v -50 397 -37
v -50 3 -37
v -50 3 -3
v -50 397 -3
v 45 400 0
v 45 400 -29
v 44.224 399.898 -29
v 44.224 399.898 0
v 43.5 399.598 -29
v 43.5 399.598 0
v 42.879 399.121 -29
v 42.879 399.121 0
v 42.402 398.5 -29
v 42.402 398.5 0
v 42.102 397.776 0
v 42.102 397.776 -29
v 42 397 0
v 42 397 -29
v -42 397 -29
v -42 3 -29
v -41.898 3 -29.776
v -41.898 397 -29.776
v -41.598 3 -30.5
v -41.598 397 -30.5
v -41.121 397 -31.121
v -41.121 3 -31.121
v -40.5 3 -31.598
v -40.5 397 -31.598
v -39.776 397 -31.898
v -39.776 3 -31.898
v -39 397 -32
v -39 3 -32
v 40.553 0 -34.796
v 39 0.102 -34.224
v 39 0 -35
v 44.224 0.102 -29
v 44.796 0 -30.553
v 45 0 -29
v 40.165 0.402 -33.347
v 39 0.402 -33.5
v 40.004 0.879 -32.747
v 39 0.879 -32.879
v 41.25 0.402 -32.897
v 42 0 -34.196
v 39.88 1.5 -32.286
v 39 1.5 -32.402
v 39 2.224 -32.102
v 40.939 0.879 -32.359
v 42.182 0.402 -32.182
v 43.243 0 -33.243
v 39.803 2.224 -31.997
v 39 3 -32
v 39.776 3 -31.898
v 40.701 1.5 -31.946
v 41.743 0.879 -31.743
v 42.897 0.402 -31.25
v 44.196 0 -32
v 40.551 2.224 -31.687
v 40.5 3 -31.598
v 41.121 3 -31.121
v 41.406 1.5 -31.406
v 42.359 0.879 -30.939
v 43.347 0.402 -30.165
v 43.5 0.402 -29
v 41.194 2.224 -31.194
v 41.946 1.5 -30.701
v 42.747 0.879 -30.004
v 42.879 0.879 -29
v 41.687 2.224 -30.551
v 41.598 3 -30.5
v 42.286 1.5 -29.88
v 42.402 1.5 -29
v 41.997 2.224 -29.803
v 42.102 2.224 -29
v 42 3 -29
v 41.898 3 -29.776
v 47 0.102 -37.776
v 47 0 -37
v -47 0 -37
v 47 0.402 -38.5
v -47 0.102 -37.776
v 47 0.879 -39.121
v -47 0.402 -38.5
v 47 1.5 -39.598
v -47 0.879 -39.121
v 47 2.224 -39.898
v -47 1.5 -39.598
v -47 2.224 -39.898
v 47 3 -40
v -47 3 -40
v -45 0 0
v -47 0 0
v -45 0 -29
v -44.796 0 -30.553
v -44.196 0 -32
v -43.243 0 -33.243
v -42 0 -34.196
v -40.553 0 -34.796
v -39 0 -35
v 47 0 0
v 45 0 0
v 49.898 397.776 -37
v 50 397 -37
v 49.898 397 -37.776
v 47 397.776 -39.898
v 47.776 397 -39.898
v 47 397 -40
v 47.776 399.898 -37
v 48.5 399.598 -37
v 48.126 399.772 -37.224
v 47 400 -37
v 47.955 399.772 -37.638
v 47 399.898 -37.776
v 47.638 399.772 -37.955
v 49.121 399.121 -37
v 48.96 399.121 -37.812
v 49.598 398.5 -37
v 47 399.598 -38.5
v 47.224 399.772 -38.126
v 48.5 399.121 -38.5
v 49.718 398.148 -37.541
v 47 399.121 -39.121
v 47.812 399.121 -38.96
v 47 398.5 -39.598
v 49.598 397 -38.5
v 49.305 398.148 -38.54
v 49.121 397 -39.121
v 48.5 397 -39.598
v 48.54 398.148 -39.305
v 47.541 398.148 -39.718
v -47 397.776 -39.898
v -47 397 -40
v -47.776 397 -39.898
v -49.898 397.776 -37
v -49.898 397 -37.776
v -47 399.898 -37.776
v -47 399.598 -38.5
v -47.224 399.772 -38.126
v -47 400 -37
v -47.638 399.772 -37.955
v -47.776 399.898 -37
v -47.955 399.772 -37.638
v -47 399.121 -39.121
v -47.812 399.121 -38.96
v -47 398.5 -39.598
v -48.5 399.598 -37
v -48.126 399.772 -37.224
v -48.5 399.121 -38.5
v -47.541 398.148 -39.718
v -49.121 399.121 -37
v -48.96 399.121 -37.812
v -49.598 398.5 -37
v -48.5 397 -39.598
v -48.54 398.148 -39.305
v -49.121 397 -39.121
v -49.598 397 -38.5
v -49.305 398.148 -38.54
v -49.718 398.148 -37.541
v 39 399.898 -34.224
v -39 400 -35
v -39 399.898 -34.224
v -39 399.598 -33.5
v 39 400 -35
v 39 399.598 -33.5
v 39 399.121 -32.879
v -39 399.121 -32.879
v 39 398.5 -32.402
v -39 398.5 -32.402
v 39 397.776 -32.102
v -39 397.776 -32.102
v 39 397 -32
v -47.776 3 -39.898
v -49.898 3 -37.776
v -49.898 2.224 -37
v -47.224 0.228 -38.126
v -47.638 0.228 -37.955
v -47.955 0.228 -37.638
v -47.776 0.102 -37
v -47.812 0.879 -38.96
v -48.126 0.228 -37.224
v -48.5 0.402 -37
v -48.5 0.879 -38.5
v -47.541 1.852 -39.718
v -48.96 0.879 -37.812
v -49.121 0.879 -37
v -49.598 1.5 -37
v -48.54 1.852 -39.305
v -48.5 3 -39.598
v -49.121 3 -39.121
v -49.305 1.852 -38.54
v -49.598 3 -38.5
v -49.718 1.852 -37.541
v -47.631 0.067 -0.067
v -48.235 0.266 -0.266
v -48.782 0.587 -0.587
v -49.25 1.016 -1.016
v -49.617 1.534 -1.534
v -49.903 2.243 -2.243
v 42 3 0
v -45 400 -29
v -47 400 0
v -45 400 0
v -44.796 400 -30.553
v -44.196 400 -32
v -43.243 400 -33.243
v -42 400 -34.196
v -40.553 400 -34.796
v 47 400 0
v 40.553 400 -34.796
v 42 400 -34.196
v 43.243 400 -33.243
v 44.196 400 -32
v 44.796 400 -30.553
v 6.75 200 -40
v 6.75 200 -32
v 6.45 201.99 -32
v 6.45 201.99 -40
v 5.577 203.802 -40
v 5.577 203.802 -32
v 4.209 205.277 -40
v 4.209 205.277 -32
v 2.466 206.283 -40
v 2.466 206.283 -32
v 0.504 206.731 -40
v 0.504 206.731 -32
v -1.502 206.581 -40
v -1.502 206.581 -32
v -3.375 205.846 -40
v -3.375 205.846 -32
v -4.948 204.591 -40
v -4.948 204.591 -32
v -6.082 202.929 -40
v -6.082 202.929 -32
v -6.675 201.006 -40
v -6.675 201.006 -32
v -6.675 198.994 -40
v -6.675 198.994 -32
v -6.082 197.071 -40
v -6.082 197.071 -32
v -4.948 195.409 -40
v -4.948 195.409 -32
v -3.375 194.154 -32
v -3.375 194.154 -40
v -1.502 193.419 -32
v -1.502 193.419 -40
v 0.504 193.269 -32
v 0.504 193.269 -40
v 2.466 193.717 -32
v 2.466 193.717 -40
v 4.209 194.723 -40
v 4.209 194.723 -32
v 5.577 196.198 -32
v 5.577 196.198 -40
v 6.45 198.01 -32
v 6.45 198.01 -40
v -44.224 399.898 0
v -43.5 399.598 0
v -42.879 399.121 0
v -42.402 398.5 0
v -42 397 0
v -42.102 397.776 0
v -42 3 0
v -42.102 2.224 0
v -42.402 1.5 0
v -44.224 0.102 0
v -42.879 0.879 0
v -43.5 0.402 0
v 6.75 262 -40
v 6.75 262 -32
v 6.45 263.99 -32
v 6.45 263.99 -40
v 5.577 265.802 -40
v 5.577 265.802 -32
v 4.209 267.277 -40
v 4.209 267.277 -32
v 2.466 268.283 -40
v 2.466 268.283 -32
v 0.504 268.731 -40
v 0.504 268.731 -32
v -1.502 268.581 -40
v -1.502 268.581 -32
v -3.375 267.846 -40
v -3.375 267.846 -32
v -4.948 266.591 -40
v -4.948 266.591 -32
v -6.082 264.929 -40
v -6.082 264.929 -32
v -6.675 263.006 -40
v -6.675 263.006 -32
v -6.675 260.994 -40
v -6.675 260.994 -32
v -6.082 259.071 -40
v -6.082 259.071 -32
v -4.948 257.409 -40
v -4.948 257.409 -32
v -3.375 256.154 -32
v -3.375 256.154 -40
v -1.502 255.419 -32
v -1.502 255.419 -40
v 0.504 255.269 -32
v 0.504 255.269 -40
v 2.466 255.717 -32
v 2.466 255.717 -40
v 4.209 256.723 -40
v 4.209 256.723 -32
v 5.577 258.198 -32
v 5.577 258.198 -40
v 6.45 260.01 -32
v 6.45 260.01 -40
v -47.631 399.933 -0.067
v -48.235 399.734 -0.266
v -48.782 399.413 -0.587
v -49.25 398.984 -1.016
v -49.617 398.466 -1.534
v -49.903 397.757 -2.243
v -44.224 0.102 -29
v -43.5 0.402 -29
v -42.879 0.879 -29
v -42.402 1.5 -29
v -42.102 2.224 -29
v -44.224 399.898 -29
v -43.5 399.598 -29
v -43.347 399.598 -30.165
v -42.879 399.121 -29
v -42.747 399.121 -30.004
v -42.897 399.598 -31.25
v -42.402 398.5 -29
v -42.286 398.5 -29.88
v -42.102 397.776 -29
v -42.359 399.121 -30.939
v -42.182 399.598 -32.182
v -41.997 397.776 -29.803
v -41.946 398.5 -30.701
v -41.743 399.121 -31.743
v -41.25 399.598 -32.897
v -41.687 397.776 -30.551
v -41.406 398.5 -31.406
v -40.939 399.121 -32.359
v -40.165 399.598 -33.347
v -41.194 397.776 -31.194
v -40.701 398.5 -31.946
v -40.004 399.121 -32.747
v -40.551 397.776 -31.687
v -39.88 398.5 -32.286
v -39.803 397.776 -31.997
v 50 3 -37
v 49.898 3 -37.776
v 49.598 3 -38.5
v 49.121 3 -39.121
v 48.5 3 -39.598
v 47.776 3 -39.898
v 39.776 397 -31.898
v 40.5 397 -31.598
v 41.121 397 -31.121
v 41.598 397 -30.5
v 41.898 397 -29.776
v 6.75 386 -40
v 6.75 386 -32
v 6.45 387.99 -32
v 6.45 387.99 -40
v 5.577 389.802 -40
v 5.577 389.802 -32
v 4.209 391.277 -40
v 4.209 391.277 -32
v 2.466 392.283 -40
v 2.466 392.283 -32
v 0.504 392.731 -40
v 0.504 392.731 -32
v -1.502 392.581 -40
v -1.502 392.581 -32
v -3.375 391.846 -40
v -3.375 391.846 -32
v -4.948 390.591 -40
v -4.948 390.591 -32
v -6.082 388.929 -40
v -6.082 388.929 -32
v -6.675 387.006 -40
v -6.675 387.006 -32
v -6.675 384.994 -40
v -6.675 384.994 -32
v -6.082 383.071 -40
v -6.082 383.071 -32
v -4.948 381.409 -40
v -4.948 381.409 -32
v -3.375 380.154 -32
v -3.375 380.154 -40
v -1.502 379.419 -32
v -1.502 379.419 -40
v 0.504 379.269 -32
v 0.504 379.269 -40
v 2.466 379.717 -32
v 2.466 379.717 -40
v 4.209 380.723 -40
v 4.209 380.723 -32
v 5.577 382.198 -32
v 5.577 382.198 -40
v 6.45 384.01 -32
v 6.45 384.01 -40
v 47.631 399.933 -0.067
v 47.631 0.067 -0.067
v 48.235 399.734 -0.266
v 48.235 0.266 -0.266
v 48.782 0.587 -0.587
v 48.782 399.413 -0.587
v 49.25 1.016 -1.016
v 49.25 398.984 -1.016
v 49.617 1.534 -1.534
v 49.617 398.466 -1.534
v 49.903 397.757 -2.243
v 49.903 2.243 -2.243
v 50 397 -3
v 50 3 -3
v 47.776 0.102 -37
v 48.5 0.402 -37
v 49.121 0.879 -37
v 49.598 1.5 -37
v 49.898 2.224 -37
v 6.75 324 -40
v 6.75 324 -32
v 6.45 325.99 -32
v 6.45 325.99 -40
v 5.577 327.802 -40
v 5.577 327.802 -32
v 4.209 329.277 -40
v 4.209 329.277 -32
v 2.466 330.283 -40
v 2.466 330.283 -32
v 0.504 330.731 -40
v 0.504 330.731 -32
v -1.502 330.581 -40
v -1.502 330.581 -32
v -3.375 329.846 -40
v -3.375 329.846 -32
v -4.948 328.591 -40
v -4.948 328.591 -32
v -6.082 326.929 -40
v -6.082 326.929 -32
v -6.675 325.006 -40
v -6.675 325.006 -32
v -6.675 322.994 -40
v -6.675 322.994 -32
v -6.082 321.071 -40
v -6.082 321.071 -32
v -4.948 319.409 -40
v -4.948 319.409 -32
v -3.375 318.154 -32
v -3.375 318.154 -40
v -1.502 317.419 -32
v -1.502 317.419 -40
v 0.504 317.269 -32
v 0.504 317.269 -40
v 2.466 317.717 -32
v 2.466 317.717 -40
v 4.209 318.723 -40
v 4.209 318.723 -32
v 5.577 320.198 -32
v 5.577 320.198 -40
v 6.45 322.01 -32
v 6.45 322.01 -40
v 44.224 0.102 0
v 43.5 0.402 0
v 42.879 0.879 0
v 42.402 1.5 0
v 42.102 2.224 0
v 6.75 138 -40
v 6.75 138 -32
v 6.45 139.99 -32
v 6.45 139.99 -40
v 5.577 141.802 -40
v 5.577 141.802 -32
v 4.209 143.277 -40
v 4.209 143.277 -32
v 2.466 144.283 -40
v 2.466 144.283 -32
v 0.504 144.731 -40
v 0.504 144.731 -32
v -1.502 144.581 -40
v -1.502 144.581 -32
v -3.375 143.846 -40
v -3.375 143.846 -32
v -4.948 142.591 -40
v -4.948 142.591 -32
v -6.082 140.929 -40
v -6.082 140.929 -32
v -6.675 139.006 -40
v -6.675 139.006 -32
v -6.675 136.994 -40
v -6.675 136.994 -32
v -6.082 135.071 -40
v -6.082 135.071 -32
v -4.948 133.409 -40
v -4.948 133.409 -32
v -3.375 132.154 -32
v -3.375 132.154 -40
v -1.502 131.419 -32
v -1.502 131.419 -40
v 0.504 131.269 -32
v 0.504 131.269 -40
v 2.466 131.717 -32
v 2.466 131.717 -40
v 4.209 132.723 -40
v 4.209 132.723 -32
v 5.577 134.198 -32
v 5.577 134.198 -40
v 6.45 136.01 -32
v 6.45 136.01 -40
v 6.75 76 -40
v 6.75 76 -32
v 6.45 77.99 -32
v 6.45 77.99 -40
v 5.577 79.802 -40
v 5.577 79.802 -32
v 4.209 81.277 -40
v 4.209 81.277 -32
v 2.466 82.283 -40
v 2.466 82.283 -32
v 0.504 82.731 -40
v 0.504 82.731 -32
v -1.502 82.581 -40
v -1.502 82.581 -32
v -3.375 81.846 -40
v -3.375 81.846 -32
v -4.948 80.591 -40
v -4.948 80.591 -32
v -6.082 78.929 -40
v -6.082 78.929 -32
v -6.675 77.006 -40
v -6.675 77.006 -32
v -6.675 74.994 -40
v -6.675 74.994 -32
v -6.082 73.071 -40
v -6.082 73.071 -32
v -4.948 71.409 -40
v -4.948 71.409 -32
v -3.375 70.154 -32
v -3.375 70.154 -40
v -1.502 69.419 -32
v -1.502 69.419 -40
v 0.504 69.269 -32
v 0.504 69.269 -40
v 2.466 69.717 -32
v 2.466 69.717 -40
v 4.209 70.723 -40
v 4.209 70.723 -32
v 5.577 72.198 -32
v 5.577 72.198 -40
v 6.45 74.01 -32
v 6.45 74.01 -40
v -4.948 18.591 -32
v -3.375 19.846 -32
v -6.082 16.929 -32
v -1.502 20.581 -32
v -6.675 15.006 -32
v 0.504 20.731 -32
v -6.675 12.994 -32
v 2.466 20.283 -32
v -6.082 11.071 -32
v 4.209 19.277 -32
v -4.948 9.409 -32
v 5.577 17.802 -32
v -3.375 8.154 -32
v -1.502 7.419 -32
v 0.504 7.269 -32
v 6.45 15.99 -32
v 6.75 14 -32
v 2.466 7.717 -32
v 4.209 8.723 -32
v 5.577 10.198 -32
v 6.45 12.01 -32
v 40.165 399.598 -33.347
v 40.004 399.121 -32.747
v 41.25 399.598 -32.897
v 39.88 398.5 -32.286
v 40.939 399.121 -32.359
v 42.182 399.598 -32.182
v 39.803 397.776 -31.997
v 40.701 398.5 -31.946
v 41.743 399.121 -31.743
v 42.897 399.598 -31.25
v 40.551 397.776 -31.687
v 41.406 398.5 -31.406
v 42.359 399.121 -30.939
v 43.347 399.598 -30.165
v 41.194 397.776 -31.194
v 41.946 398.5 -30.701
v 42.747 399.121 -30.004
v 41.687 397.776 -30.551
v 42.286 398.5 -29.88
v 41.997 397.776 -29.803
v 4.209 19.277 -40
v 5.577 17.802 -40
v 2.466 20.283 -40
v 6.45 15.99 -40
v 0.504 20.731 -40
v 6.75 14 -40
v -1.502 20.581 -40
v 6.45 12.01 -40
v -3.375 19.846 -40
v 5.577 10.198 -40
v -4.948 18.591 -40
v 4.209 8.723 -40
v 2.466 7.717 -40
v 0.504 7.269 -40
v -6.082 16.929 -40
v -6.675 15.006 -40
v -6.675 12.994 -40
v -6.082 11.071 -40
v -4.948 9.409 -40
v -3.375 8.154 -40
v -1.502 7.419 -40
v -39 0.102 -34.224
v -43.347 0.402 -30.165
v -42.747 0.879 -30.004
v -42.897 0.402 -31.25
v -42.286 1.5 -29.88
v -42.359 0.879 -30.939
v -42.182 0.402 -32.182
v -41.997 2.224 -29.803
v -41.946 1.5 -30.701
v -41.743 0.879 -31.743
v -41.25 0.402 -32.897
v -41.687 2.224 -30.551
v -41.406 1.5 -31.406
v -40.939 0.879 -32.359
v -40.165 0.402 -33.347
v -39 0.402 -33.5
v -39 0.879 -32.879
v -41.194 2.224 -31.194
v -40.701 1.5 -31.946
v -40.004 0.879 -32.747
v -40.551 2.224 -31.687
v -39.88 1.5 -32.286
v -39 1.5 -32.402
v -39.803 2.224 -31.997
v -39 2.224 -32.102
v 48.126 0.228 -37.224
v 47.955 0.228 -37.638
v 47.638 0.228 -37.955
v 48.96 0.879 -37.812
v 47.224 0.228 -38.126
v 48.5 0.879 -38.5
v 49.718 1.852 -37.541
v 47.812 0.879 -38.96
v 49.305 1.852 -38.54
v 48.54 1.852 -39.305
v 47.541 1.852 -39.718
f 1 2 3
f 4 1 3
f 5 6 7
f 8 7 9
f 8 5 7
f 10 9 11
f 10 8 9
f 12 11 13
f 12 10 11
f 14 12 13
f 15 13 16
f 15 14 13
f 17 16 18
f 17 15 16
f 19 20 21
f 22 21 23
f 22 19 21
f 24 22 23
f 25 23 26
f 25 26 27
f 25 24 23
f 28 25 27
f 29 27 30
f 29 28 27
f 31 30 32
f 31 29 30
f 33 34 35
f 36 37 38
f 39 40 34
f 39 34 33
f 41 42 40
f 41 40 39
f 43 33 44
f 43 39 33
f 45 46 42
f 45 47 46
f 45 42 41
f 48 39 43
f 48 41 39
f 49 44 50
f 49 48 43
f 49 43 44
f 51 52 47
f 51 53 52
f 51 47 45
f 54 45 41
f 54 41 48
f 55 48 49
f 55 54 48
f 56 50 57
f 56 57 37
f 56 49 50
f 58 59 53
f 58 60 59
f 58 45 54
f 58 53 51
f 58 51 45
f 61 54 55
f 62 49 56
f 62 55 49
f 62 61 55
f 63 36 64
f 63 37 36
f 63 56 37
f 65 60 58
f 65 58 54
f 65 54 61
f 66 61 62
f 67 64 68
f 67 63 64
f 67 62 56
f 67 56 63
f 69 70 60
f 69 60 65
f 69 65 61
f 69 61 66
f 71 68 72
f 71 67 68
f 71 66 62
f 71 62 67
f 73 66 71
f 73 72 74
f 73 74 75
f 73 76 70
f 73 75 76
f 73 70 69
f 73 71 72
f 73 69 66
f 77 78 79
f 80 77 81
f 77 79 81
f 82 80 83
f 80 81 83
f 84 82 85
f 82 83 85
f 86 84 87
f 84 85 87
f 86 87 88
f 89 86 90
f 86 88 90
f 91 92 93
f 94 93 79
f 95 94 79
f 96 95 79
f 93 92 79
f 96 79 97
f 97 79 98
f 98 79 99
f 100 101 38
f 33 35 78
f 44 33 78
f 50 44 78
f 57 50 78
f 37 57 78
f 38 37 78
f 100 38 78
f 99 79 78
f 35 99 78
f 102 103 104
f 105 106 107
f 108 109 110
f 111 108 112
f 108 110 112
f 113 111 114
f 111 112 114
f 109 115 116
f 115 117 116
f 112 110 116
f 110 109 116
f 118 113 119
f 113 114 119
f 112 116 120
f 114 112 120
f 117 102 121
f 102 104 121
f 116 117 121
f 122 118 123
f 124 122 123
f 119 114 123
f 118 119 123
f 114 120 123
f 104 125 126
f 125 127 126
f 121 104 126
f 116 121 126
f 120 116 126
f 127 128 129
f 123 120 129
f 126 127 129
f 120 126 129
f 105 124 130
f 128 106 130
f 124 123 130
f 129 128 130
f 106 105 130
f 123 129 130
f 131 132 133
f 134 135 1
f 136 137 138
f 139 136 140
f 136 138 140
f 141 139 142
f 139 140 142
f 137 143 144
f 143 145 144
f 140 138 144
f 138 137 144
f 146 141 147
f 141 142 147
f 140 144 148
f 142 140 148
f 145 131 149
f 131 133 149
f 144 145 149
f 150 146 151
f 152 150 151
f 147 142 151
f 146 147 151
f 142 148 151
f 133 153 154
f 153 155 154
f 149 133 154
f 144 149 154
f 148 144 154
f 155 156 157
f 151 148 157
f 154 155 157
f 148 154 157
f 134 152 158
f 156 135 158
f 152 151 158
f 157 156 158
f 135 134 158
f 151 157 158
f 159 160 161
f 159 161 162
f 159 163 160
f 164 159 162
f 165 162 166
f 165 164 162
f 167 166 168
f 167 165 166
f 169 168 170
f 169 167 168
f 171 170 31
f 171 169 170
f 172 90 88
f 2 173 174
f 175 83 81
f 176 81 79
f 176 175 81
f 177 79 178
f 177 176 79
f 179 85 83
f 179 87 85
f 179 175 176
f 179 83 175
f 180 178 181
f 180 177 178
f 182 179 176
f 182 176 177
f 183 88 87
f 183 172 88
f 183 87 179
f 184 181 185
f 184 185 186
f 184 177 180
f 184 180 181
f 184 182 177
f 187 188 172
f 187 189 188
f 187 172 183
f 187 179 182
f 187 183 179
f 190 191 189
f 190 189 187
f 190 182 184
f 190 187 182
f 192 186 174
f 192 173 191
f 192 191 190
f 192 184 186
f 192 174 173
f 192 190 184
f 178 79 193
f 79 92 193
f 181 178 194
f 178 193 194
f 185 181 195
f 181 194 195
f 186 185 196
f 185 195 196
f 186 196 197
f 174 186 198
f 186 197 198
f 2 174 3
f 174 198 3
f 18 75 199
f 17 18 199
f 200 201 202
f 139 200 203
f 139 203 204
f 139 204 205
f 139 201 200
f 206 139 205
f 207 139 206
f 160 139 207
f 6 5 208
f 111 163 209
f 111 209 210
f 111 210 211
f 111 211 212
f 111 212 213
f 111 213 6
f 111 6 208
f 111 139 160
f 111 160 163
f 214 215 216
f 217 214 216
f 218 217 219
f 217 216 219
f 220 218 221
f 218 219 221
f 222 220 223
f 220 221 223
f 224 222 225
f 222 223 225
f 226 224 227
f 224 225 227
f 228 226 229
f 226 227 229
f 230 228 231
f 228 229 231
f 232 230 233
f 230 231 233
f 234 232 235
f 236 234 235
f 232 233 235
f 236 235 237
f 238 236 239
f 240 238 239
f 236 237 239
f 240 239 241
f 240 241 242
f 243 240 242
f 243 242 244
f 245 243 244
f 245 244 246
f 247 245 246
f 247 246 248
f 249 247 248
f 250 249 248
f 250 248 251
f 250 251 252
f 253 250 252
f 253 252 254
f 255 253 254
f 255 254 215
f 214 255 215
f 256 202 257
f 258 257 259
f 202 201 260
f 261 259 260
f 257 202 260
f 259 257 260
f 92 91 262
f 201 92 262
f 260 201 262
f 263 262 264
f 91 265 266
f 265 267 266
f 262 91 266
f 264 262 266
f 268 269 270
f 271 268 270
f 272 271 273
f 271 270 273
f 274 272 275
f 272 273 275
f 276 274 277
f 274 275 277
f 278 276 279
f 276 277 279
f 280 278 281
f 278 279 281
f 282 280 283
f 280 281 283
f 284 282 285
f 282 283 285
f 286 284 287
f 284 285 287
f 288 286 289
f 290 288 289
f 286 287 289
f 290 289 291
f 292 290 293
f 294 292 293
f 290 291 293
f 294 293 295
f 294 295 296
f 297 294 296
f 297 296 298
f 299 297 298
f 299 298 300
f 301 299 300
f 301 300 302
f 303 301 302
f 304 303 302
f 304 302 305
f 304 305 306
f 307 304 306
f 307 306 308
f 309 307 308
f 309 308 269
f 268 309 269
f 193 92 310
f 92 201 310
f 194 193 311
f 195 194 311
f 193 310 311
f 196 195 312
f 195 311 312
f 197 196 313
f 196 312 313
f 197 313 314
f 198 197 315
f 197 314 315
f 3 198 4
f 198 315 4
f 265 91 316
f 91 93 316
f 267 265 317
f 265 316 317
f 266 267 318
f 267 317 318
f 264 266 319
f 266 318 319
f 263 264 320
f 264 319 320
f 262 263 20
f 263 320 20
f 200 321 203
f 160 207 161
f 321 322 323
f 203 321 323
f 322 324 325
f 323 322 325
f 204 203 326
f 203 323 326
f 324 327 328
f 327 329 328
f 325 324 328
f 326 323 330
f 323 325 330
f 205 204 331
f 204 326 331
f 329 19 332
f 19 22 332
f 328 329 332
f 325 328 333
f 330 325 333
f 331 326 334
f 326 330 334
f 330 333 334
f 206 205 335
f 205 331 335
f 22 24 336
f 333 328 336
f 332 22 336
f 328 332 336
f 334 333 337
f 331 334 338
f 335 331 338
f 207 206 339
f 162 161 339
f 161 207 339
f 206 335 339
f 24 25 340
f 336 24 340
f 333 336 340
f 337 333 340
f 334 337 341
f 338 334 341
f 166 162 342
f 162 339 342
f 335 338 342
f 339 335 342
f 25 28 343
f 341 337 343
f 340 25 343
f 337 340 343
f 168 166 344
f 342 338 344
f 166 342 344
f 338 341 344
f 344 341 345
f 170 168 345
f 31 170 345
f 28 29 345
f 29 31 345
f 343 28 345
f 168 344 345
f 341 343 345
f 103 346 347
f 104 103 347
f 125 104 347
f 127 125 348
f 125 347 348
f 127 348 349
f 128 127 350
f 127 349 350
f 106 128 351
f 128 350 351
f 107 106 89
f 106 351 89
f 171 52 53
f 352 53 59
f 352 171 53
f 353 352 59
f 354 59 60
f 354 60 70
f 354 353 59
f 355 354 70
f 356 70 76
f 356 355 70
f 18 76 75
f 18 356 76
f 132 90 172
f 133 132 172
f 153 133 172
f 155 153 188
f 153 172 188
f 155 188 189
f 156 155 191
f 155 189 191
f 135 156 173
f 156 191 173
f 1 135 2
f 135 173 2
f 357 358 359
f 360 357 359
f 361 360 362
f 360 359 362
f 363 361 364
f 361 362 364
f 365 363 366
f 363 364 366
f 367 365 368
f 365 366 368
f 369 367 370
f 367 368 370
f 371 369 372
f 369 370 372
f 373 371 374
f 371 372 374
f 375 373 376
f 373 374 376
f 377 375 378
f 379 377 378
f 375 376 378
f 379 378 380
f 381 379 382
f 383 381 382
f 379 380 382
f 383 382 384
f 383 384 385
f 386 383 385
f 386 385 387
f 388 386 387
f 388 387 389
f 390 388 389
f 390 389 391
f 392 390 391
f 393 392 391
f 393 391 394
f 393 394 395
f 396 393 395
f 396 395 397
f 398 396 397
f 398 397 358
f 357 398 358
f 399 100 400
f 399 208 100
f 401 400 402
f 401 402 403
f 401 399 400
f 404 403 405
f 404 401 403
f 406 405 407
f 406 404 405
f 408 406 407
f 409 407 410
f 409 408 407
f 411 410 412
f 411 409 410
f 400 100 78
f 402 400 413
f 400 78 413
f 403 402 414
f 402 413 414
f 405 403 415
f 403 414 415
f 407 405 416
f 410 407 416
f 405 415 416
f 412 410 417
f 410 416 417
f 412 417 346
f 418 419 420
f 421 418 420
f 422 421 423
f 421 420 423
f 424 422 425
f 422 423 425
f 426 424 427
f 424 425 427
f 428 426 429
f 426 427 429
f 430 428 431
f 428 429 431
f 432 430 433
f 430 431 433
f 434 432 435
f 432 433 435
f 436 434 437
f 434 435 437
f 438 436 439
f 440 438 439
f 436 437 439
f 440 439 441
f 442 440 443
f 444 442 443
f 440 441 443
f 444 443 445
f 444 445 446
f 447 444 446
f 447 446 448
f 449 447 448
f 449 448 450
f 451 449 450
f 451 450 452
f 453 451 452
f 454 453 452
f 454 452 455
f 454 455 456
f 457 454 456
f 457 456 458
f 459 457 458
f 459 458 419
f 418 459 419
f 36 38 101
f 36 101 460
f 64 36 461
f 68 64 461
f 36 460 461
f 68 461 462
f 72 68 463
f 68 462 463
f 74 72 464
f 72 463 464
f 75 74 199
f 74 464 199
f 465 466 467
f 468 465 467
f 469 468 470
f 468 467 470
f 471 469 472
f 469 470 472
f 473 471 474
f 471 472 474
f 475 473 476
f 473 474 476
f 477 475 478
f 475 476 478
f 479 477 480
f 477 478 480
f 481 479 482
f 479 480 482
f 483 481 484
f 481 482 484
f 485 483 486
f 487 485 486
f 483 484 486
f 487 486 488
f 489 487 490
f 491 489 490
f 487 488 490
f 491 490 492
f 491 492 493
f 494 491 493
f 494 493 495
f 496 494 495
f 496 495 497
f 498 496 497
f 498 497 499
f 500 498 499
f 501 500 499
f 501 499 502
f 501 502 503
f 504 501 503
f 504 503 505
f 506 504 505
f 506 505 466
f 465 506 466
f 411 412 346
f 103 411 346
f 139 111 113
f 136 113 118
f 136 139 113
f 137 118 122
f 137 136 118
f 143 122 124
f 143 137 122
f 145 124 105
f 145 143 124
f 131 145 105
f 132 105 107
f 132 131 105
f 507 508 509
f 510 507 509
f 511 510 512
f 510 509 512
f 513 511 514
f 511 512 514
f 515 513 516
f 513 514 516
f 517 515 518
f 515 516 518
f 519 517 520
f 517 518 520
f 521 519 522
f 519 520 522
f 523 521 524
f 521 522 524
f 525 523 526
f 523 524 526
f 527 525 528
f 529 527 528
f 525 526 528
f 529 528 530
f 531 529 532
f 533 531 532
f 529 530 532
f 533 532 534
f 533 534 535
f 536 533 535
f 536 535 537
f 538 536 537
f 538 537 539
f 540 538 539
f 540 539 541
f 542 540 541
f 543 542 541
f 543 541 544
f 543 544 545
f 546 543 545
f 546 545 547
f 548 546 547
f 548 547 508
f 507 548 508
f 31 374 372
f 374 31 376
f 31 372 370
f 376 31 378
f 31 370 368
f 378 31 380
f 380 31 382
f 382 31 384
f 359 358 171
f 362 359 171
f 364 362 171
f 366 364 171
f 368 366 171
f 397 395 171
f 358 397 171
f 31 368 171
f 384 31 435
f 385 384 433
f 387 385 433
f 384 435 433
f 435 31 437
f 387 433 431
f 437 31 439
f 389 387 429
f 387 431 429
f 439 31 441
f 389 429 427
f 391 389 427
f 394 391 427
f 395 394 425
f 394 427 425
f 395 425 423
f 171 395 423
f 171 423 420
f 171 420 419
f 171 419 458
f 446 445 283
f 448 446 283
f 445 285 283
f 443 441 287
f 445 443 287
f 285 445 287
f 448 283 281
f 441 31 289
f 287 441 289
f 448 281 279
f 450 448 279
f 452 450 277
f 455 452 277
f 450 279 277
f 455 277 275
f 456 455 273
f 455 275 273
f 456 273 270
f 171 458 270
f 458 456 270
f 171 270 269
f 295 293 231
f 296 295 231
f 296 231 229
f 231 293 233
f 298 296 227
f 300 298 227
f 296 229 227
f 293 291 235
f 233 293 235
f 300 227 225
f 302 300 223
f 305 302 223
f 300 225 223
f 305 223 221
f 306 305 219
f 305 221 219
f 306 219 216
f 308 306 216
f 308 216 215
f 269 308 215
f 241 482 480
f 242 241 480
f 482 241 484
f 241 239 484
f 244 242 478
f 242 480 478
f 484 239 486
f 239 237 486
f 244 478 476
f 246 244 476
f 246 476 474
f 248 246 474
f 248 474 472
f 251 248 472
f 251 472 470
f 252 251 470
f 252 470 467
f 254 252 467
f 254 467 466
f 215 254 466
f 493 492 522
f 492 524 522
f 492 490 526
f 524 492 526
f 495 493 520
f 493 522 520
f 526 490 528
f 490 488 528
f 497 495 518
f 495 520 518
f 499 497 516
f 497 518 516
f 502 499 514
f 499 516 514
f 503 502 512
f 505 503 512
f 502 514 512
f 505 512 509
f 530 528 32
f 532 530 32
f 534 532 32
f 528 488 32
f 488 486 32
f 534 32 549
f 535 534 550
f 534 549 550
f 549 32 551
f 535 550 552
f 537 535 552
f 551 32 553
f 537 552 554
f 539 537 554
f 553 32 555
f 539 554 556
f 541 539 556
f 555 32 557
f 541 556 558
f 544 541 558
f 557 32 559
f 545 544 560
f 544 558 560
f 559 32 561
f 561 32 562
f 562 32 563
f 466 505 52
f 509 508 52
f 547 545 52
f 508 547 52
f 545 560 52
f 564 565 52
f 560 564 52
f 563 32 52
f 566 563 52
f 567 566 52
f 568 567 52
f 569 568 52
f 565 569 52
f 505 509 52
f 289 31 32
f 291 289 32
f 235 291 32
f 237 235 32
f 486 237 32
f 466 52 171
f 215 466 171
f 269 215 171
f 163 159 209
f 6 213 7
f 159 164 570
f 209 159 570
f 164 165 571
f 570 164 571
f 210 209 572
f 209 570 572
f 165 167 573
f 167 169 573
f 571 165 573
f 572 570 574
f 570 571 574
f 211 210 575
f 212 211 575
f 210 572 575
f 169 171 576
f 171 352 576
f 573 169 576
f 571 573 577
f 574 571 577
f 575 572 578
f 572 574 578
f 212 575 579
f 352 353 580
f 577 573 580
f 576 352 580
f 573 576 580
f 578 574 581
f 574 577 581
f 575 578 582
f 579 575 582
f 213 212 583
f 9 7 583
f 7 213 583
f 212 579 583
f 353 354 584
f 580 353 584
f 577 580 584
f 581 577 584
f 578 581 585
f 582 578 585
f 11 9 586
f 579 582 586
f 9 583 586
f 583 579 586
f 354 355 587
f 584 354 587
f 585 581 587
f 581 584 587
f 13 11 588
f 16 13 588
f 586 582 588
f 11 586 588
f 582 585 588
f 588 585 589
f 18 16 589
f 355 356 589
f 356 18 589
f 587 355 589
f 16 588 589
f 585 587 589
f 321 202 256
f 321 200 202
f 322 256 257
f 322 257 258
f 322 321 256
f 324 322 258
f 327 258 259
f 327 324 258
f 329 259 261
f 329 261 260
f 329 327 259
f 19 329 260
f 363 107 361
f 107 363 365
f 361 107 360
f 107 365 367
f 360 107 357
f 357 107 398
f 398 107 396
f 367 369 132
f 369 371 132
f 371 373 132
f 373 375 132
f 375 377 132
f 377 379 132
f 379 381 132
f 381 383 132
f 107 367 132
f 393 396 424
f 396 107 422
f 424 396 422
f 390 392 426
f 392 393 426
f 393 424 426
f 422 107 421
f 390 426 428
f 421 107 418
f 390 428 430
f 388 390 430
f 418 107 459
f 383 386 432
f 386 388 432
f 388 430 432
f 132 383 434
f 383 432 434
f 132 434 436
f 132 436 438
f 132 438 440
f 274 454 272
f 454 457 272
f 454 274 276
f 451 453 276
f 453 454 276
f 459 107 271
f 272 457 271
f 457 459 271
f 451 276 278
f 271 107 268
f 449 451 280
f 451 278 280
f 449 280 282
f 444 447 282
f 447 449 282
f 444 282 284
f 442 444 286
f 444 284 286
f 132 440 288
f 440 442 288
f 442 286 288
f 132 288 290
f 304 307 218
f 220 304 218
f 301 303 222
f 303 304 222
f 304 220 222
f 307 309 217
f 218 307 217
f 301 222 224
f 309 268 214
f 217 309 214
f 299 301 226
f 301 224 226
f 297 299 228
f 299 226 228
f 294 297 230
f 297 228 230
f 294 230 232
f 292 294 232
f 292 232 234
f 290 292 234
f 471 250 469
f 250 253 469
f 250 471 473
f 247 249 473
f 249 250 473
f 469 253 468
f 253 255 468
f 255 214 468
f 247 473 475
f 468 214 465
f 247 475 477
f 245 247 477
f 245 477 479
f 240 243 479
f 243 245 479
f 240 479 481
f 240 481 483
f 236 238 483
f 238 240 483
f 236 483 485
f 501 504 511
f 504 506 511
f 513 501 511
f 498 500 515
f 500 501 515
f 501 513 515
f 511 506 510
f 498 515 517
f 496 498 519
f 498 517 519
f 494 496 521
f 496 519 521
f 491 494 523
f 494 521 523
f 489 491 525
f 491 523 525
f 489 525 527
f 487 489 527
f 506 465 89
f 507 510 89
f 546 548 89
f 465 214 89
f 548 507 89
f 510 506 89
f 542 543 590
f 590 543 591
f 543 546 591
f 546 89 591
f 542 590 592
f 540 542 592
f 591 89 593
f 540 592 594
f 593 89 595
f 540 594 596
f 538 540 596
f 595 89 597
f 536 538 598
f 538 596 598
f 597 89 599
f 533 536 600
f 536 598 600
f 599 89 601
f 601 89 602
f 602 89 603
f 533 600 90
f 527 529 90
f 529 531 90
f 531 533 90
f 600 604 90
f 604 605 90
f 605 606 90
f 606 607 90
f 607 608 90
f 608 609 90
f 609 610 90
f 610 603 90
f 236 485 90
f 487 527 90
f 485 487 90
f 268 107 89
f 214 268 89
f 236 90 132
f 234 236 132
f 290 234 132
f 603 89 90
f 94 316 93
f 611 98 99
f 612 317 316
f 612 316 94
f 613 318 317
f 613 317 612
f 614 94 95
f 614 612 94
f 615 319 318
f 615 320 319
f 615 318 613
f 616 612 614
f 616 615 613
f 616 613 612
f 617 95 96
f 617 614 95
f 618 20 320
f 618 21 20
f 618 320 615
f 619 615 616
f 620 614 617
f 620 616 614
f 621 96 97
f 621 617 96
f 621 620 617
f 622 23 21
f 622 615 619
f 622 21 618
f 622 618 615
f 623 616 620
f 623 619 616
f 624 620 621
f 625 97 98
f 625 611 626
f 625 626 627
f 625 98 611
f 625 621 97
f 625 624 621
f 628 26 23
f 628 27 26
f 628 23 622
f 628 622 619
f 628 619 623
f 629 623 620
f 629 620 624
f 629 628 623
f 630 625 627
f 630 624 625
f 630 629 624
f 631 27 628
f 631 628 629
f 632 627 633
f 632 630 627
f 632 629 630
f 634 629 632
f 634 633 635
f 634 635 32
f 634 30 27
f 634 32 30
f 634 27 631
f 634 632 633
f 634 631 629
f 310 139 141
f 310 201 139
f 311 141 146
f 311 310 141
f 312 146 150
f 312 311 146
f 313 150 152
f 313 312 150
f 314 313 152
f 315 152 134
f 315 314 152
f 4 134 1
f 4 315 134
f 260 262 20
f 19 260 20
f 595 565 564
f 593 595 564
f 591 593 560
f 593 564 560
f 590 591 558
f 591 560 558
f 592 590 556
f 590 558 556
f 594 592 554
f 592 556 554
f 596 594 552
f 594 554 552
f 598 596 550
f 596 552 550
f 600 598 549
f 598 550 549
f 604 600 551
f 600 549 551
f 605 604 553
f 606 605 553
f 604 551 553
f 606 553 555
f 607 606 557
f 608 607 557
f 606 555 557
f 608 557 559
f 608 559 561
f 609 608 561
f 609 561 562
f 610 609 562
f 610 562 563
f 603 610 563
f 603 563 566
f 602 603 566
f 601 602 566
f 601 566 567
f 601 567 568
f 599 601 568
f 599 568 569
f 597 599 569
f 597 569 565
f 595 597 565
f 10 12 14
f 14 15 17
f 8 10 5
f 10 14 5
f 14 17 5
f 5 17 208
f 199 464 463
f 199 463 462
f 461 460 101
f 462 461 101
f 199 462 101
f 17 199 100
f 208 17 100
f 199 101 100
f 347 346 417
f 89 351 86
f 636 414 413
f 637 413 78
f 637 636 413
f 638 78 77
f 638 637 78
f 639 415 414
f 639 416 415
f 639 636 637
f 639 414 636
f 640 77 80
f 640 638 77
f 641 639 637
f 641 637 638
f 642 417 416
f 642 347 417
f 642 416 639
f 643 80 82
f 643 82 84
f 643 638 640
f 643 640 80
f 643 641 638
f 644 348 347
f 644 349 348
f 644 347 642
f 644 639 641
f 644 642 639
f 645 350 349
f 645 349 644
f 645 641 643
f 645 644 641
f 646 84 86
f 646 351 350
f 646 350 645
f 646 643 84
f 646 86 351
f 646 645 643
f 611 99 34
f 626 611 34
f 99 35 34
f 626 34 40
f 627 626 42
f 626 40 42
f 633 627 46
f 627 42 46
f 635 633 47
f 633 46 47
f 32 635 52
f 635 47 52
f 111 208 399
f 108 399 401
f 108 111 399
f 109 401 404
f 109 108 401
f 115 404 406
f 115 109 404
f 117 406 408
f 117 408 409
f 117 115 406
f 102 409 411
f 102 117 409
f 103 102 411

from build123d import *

# Parameters (mm, degrees)
EXTRUIR_L_MINA1_DEPTH         = 400
REDONDEO1_R                   = 3
REDONDEO2_R                   = 3
TALADRO_DE_MARGEN_PARA_M121_D = 13.5


with BuildPart() as part:
    # Croquis1 → Extruir-Lámina1 (new body)
    with BuildSketch(Plane(origin=(0, 0, 0), x_dir=(1, 0, 0), z_dir=(0, 1, 0))):
        with BuildLine():
            Line((50, 0), (50, 37))
            ThreePointArc((50, 37), (49.121320344, 39.121320344), (47, 40))
            Line((47, 40), (-47, 40))
            ThreePointArc((-47, 40), (-49.121320344, 39.121320344), (-50, 37))
            Line((-50, 37), (-50, 0))
            Line((-50, 0), (-42, 0))
            Line((-42, 0), (-42, 32))
            Line((-42, 32), (42, 32))
            Line((42, 32), (42, 0))
            Line((42, 0), (50, 0))
        make_face()
    extrude(amount=EXTRUIR_L_MINA1_DEPTH)

    # Redondeo1
    redondeo1_edges = [part.edges().sort_by_distance(p)[0] for p in [
        (42, 200, -32),
        (-42, 200, -32),
    ]]
    fillet(redondeo1_edges, radius=REDONDEO1_R)

    # Redondeo2
    redondeo2_edges = [part.edges().sort_by_distance(p)[0] for p in [
        (-50, 0, -18.5),
        (-49.121320344, 0, -39.121320344),
        (0, 0, -40),
        (49.121320344, 0, -39.121320344),
        (50, 0, -18.5),
        (50, 400, -18.5),
        (-50, 200, 0),
        (50, 200, 0),
        (49.121320344, 400, -39.121320344),
        (0, 400, -40),
        (-49.121320344, 400, -39.121320344),
        (42, 0, -14.5),
        (-50, 400, -18.5),
        (42, 400, -14.5),
        (0, 0, -32),
        (0, 400, -32),
        (41.121320344, 0, -31.121320344),
        (41.121320344, 400, -31.121320344),
        (-41.121320344, 0, -31.121320344),
        (-41.121320344, 400, -31.121320344),
        (-42, 400, -14.5),
        (-42, 0, -14.5),
    ]]
    fillet(redondeo2_edges, radius=REDONDEO2_R)

    # Taladro de margen para M121 (through all)
    with Locations(Plane(origin=(0, 0, -40), x_dir=(-1, 0, 0), z_dir=(0, 0, -1))):
        with Locations((0, 386), (0, 324), (0, 262), (0, 200), (0, 138), (0, 76), (0, 14)):
            Hole(TALADRO_DE_MARGEN_PARA_M121_D / 2)


solid = part.part
